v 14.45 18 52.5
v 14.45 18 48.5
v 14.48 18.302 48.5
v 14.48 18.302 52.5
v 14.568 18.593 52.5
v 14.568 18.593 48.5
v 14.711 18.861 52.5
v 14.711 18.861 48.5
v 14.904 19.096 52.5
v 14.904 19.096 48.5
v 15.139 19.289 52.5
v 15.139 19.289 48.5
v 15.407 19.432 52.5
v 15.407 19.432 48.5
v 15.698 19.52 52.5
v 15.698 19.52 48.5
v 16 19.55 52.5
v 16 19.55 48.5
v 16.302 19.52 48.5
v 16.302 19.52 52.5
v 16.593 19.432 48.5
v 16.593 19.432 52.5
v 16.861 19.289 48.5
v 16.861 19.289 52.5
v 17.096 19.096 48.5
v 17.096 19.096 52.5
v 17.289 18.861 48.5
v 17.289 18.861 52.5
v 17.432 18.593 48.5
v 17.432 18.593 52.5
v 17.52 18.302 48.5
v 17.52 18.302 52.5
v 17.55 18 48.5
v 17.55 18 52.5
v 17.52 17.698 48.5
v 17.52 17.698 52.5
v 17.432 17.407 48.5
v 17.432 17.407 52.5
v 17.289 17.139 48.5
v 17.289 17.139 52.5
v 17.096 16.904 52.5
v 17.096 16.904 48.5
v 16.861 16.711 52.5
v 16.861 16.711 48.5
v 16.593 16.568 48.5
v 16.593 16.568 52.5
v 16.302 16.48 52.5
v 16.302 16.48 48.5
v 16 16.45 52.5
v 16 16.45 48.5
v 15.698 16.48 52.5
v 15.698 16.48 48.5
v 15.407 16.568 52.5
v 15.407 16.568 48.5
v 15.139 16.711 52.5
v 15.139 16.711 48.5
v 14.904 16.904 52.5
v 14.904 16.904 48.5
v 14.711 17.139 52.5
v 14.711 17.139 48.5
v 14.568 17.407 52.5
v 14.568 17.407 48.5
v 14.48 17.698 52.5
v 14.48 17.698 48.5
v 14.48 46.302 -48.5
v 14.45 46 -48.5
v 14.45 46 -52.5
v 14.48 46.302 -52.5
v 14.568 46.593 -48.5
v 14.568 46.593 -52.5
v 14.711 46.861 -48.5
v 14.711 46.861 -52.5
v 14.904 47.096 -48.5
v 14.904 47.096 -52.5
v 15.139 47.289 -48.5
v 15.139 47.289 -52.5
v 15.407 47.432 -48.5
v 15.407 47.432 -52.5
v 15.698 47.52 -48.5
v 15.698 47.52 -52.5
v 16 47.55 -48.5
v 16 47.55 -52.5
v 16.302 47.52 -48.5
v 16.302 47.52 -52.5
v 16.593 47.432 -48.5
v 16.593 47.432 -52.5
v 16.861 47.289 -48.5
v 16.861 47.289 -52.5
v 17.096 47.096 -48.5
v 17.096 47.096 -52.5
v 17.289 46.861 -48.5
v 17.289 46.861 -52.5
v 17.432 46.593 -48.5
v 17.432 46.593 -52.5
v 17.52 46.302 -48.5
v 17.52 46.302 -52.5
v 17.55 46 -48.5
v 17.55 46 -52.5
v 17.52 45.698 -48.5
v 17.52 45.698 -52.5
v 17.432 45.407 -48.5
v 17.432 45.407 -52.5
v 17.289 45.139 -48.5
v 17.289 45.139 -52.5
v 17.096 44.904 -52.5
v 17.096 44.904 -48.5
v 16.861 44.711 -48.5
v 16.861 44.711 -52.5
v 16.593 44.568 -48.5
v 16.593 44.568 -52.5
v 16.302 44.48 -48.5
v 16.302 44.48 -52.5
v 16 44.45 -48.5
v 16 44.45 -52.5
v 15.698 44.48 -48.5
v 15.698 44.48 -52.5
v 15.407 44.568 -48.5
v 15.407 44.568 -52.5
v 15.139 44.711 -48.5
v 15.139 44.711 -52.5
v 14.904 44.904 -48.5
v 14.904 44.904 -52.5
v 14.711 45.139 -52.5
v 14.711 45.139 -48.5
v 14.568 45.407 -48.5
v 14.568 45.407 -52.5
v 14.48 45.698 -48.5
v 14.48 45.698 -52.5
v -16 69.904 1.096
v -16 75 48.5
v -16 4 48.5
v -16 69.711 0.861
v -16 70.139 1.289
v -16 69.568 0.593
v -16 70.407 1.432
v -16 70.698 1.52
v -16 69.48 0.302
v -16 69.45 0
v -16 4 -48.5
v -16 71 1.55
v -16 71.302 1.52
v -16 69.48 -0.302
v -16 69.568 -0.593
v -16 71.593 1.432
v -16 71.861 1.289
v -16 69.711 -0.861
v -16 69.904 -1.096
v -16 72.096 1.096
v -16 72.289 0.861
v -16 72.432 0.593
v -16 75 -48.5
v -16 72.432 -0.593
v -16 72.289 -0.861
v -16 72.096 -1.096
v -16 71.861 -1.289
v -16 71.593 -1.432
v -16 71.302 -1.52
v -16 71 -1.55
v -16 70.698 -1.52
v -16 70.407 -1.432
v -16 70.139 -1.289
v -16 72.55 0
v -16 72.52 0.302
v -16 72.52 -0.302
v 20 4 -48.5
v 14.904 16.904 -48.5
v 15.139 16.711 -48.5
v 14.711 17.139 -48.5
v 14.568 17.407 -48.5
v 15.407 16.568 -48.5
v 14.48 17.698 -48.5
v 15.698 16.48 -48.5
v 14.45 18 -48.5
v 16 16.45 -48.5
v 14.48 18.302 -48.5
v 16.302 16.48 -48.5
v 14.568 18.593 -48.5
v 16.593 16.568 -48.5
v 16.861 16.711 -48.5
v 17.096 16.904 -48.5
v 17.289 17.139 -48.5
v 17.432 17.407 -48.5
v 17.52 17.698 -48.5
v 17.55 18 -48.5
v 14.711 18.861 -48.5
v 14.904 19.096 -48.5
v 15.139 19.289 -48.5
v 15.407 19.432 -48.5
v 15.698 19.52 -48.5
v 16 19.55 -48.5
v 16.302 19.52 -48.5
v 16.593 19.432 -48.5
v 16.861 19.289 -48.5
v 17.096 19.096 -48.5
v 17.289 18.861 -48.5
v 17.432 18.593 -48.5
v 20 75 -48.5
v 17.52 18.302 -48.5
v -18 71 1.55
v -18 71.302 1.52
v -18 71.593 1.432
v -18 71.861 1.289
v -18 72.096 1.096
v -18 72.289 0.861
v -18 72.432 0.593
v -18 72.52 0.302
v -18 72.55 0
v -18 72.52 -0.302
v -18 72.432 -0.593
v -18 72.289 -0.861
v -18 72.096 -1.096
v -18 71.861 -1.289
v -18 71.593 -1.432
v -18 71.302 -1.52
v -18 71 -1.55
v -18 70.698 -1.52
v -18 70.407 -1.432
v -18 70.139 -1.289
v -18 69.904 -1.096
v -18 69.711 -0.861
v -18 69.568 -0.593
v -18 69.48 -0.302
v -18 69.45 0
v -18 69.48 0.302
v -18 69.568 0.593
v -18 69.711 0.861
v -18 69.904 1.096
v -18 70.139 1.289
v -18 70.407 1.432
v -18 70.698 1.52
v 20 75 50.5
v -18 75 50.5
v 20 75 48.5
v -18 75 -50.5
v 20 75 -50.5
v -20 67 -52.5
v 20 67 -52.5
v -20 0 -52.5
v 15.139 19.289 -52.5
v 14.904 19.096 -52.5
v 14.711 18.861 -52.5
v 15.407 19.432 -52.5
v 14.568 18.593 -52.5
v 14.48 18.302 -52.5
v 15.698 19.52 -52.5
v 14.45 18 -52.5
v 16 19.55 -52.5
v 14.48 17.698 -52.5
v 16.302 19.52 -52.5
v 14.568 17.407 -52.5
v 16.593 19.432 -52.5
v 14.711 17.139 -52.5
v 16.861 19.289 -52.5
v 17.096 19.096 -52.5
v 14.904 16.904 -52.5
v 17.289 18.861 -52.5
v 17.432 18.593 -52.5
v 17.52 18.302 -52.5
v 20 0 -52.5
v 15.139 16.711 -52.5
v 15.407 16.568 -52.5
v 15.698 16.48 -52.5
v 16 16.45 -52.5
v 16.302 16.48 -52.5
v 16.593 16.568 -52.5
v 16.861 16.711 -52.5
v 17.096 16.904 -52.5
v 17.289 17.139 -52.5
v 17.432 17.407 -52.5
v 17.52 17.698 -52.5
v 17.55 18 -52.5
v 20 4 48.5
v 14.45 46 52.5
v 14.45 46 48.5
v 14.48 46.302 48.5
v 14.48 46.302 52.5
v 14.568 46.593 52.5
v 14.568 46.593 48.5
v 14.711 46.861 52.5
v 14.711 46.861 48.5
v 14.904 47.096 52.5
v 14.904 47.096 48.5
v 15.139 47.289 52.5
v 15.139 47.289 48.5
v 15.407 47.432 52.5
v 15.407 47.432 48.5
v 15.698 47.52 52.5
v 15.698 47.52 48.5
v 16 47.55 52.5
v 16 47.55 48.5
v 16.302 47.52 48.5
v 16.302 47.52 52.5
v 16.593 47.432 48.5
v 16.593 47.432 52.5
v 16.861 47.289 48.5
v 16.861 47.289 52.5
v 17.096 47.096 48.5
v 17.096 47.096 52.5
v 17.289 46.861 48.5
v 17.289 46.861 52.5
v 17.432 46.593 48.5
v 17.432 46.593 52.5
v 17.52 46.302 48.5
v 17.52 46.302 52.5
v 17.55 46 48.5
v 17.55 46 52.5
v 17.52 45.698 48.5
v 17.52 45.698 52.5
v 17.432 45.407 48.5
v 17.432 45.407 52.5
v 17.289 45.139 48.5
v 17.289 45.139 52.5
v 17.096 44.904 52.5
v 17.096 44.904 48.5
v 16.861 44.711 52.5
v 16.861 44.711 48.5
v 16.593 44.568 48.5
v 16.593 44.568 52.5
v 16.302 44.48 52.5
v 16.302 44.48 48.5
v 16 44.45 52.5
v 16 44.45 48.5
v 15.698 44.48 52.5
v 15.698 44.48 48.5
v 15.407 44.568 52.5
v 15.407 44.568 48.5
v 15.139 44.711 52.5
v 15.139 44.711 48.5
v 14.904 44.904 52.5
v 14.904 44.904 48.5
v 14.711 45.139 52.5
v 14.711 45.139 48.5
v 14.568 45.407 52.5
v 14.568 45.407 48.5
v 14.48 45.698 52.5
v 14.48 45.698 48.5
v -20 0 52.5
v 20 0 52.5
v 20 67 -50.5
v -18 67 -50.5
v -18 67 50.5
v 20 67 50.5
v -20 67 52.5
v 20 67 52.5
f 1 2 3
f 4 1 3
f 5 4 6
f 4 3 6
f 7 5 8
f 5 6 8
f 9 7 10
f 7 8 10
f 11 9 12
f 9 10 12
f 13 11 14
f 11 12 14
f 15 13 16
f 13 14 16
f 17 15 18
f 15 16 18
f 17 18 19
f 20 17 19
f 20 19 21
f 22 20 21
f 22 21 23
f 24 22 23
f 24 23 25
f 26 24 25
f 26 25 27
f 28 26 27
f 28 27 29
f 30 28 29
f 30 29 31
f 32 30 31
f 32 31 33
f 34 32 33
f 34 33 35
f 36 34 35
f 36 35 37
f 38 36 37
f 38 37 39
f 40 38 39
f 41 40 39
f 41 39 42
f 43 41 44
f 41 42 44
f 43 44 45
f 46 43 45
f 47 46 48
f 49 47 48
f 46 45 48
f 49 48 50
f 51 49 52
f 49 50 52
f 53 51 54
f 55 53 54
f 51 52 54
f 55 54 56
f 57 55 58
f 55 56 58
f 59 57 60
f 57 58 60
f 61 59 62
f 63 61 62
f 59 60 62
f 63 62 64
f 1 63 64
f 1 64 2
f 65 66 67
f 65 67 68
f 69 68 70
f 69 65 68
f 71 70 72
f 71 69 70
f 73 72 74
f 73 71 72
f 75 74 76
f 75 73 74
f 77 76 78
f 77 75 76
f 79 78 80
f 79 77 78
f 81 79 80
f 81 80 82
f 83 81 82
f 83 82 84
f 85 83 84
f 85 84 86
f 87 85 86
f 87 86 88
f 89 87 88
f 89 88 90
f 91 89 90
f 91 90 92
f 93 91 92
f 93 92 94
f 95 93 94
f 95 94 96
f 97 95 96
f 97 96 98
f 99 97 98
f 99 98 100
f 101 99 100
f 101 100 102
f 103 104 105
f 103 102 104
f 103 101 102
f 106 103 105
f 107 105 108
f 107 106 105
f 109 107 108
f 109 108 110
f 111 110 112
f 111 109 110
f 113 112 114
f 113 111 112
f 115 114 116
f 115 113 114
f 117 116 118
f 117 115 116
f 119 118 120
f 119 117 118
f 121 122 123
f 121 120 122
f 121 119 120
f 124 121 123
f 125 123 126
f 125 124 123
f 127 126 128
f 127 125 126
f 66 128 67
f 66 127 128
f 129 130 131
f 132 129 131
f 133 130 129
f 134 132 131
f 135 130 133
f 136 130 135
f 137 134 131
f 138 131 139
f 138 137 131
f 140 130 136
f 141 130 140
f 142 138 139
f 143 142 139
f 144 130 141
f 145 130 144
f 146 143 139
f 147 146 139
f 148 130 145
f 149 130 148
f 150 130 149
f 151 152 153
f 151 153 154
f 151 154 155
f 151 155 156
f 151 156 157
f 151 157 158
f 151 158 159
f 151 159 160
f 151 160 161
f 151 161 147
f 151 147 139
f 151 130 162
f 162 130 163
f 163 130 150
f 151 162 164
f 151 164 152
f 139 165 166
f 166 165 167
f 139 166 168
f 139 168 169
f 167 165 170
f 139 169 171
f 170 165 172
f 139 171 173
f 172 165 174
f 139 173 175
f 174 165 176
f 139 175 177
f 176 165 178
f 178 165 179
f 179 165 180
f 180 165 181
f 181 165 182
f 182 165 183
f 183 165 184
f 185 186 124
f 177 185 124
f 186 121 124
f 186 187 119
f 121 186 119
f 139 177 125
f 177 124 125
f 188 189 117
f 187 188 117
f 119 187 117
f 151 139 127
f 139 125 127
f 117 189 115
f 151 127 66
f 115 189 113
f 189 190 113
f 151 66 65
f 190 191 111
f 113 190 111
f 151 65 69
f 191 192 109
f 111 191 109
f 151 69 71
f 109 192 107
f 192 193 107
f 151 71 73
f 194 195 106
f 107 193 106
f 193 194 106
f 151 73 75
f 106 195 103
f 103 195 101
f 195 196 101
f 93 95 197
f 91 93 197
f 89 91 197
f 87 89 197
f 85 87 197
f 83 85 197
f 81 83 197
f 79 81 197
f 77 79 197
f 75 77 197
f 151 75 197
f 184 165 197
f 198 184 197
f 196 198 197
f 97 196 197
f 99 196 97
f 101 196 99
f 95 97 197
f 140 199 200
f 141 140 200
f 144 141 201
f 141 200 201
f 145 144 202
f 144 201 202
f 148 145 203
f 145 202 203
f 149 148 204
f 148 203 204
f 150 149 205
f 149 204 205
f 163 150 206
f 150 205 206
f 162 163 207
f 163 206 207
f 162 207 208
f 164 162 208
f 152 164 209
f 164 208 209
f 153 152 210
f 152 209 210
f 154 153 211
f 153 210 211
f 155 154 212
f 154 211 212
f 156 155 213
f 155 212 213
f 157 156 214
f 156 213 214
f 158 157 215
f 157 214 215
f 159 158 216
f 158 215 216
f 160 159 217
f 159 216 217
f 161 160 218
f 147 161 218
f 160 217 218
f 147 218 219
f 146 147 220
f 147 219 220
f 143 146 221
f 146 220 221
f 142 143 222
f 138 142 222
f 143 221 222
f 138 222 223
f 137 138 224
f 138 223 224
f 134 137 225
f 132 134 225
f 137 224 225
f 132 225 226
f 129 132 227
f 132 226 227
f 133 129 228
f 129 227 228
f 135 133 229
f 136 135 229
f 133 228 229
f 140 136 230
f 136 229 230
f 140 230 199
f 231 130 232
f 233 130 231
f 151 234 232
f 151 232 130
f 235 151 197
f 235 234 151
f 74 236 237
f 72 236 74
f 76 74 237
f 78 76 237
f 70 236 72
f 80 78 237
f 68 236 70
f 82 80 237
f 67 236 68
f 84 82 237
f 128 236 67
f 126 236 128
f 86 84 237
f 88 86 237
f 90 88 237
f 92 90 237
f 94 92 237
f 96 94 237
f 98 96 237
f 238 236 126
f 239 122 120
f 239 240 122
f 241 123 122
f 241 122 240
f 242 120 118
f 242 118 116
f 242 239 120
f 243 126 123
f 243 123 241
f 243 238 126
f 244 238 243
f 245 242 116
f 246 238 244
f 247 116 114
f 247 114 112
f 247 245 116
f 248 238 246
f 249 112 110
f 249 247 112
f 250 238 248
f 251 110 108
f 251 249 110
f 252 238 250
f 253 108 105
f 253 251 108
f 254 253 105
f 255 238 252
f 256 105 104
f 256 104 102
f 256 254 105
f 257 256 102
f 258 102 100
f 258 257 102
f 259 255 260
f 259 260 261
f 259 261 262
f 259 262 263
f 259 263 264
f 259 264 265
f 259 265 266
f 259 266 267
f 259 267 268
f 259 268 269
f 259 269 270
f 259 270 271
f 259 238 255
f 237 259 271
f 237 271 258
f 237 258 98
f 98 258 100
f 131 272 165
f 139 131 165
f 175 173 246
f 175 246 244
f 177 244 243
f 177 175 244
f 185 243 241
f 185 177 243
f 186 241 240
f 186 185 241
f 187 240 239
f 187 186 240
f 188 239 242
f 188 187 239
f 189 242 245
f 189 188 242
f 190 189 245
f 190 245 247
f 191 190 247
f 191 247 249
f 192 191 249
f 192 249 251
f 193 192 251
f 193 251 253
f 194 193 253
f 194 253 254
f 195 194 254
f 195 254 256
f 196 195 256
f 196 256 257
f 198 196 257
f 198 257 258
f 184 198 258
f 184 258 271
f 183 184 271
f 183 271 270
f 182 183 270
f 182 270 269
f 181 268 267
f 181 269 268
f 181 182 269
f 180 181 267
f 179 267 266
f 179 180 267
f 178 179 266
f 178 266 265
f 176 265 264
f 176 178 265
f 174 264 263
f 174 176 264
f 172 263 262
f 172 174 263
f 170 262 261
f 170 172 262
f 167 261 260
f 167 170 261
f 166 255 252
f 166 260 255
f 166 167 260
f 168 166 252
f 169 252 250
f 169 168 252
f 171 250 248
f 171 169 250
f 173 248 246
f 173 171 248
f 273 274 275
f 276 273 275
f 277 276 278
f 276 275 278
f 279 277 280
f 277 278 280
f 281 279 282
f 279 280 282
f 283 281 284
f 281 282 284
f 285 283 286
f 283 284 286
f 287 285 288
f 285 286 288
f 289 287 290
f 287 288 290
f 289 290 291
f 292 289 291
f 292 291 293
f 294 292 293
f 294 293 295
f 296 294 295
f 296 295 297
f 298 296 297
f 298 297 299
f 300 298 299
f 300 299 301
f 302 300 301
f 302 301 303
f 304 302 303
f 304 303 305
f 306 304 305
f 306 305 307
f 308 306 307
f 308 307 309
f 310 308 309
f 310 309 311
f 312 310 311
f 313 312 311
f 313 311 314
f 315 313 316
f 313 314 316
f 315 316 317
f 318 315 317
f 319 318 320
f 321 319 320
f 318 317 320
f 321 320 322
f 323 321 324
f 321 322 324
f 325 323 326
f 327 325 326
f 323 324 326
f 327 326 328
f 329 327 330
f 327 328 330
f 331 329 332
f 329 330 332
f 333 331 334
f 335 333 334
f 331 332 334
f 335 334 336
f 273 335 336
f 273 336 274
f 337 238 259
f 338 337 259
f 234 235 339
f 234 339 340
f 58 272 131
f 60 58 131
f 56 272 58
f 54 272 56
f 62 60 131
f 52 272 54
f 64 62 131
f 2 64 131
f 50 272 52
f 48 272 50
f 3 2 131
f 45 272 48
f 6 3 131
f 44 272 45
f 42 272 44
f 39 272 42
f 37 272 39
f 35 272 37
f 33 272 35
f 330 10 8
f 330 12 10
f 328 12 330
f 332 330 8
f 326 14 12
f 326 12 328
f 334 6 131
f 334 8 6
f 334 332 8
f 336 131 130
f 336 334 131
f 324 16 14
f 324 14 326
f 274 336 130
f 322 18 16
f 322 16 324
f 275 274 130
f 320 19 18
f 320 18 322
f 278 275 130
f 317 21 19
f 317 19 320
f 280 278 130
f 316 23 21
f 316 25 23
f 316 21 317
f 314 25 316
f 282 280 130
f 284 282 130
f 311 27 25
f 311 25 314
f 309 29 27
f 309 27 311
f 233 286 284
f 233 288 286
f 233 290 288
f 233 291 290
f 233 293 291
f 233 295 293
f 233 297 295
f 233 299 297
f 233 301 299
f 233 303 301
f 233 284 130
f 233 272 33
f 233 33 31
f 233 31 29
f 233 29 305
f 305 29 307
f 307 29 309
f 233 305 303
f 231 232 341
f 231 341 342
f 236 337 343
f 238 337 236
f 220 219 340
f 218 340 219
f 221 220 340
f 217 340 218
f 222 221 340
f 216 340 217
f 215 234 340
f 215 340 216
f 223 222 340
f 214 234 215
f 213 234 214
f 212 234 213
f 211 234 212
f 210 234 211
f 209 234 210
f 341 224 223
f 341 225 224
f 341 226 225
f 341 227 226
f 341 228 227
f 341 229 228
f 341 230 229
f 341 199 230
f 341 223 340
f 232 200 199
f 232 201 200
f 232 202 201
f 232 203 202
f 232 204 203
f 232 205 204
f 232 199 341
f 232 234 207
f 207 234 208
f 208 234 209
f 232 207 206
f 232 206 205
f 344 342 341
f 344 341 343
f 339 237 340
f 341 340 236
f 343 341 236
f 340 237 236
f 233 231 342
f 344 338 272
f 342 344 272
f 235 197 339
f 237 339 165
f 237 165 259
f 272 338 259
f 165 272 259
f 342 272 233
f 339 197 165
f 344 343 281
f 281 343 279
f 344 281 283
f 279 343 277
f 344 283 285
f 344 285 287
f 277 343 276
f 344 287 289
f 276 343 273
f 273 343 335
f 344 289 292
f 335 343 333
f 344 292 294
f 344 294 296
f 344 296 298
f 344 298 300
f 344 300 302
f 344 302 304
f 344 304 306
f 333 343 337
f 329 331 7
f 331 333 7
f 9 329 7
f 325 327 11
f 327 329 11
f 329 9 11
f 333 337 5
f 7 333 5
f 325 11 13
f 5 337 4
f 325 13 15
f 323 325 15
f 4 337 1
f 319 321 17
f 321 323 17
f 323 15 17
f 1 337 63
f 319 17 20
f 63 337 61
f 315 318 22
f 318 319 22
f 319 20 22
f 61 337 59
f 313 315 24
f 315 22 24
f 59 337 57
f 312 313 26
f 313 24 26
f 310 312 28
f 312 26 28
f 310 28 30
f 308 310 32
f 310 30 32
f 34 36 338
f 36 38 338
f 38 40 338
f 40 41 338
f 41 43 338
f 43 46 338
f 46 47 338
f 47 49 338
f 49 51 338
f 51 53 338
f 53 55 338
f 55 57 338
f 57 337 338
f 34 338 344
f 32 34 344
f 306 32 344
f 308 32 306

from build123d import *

# Parameters (mm, degrees)
SKETCH1_W               = 40
SKETCH1_H               = 105
BOSS_EXTRUDE3_DEPTH     = 75
SKETCH4_W               = 97
SKETCH4_H               = 71
CUT_EXTRUDE2_DEPTH      = 36
SKETCH5_W               = 40
SKETCH5_H               = 8
CUT_EXTRUDE3_DEPTH      = 2
SKETCH6_W               = 40
SKETCH6_H               = 8
CUT_EXTRUDE4_DEPTH      = 2
SKETCH7_W               = 101
SKETCH7_H               = 8
CUT_EXTRUDE5_DEPTH      = 2
SKETCH8_R               = 1.55
CUT_EXTRUDE6_DEPTH      = 102
CUT_EXTRUDE6_DEPTH_BACK = 5
SKETCH10_R              = 1.55
CUT_EXTRUDE8_DEPTH      = 2


with BuildPart() as part:
    # Sketch1 → Boss-Extrude3 (new body)
    with BuildSketch(Plane(origin=(0, 0, 0), x_dir=(1, 0, 0), z_dir=(0, 1, 0))):
        Rectangle(SKETCH1_W, SKETCH1_H)
    extrude(amount=BOSS_EXTRUDE3_DEPTH)

    # Sketch4 → Cut-Extrude2 (cut)
    with BuildSketch(Plane(origin=(20, 0, 0), x_dir=(0, 0, -1), z_dir=(1, 0, 0))):
        with Locations((0, 39.5)):
            Rectangle(SKETCH4_W, SKETCH4_H)
    extrude(amount=-CUT_EXTRUDE2_DEPTH, mode=Mode.SUBTRACT)

    # Sketch5 → Cut-Extrude3 (cut)
    with BuildSketch(Plane.XY.offset(52.5)):
        with Locations((0, 71)):
            Rectangle(SKETCH5_W, SKETCH5_H)
    extrude(amount=-CUT_EXTRUDE3_DEPTH, mode=Mode.SUBTRACT)

    # Sketch6 → Cut-Extrude4 (cut)
    with BuildSketch(Plane(origin=(0, 0, -52.5), x_dir=(-1, 0, 0), z_dir=(0, 0, -1))):
        with Locations((0, 71)):
            Rectangle(SKETCH6_W, SKETCH6_H)
    extrude(amount=-CUT_EXTRUDE4_DEPTH, mode=Mode.SUBTRACT)

    # Sketch7 → Cut-Extrude5 (cut)
    with BuildSketch(Plane.ZY.offset(20)):
        with Locations((0, 71)):
            Rectangle(SKETCH7_W, SKETCH7_H)
    extrude(amount=-CUT_EXTRUDE5_DEPTH, mode=Mode.SUBTRACT)

    # Sketch8 → Cut-Extrude6 (cut, two sides)
    with BuildSketch(Plane(origin=(0, 0, 48.5), x_dir=(-1, 0, 0), z_dir=(0, 0, -1))) as cut_extrude6_sk:
        with Locations((-16, 18)):
            Circle(SKETCH8_R)
        with Locations((-16, 46)):
            Circle(SKETCH8_R)
    extrude(amount=CUT_EXTRUDE6_DEPTH, mode=Mode.SUBTRACT)
    extrude(cut_extrude6_sk.sketch, amount=-CUT_EXTRUDE6_DEPTH_BACK, mode=Mode.SUBTRACT)

    # Sketch10 → Cut-Extrude8 (cut)
    with BuildSketch(Plane.ZY.offset(18)):
        with Locations((0, 71)):
            Circle(SKETCH10_R)
    extrude(amount=-CUT_EXTRUDE8_DEPTH, mode=Mode.SUBTRACT)


solid = part.part
